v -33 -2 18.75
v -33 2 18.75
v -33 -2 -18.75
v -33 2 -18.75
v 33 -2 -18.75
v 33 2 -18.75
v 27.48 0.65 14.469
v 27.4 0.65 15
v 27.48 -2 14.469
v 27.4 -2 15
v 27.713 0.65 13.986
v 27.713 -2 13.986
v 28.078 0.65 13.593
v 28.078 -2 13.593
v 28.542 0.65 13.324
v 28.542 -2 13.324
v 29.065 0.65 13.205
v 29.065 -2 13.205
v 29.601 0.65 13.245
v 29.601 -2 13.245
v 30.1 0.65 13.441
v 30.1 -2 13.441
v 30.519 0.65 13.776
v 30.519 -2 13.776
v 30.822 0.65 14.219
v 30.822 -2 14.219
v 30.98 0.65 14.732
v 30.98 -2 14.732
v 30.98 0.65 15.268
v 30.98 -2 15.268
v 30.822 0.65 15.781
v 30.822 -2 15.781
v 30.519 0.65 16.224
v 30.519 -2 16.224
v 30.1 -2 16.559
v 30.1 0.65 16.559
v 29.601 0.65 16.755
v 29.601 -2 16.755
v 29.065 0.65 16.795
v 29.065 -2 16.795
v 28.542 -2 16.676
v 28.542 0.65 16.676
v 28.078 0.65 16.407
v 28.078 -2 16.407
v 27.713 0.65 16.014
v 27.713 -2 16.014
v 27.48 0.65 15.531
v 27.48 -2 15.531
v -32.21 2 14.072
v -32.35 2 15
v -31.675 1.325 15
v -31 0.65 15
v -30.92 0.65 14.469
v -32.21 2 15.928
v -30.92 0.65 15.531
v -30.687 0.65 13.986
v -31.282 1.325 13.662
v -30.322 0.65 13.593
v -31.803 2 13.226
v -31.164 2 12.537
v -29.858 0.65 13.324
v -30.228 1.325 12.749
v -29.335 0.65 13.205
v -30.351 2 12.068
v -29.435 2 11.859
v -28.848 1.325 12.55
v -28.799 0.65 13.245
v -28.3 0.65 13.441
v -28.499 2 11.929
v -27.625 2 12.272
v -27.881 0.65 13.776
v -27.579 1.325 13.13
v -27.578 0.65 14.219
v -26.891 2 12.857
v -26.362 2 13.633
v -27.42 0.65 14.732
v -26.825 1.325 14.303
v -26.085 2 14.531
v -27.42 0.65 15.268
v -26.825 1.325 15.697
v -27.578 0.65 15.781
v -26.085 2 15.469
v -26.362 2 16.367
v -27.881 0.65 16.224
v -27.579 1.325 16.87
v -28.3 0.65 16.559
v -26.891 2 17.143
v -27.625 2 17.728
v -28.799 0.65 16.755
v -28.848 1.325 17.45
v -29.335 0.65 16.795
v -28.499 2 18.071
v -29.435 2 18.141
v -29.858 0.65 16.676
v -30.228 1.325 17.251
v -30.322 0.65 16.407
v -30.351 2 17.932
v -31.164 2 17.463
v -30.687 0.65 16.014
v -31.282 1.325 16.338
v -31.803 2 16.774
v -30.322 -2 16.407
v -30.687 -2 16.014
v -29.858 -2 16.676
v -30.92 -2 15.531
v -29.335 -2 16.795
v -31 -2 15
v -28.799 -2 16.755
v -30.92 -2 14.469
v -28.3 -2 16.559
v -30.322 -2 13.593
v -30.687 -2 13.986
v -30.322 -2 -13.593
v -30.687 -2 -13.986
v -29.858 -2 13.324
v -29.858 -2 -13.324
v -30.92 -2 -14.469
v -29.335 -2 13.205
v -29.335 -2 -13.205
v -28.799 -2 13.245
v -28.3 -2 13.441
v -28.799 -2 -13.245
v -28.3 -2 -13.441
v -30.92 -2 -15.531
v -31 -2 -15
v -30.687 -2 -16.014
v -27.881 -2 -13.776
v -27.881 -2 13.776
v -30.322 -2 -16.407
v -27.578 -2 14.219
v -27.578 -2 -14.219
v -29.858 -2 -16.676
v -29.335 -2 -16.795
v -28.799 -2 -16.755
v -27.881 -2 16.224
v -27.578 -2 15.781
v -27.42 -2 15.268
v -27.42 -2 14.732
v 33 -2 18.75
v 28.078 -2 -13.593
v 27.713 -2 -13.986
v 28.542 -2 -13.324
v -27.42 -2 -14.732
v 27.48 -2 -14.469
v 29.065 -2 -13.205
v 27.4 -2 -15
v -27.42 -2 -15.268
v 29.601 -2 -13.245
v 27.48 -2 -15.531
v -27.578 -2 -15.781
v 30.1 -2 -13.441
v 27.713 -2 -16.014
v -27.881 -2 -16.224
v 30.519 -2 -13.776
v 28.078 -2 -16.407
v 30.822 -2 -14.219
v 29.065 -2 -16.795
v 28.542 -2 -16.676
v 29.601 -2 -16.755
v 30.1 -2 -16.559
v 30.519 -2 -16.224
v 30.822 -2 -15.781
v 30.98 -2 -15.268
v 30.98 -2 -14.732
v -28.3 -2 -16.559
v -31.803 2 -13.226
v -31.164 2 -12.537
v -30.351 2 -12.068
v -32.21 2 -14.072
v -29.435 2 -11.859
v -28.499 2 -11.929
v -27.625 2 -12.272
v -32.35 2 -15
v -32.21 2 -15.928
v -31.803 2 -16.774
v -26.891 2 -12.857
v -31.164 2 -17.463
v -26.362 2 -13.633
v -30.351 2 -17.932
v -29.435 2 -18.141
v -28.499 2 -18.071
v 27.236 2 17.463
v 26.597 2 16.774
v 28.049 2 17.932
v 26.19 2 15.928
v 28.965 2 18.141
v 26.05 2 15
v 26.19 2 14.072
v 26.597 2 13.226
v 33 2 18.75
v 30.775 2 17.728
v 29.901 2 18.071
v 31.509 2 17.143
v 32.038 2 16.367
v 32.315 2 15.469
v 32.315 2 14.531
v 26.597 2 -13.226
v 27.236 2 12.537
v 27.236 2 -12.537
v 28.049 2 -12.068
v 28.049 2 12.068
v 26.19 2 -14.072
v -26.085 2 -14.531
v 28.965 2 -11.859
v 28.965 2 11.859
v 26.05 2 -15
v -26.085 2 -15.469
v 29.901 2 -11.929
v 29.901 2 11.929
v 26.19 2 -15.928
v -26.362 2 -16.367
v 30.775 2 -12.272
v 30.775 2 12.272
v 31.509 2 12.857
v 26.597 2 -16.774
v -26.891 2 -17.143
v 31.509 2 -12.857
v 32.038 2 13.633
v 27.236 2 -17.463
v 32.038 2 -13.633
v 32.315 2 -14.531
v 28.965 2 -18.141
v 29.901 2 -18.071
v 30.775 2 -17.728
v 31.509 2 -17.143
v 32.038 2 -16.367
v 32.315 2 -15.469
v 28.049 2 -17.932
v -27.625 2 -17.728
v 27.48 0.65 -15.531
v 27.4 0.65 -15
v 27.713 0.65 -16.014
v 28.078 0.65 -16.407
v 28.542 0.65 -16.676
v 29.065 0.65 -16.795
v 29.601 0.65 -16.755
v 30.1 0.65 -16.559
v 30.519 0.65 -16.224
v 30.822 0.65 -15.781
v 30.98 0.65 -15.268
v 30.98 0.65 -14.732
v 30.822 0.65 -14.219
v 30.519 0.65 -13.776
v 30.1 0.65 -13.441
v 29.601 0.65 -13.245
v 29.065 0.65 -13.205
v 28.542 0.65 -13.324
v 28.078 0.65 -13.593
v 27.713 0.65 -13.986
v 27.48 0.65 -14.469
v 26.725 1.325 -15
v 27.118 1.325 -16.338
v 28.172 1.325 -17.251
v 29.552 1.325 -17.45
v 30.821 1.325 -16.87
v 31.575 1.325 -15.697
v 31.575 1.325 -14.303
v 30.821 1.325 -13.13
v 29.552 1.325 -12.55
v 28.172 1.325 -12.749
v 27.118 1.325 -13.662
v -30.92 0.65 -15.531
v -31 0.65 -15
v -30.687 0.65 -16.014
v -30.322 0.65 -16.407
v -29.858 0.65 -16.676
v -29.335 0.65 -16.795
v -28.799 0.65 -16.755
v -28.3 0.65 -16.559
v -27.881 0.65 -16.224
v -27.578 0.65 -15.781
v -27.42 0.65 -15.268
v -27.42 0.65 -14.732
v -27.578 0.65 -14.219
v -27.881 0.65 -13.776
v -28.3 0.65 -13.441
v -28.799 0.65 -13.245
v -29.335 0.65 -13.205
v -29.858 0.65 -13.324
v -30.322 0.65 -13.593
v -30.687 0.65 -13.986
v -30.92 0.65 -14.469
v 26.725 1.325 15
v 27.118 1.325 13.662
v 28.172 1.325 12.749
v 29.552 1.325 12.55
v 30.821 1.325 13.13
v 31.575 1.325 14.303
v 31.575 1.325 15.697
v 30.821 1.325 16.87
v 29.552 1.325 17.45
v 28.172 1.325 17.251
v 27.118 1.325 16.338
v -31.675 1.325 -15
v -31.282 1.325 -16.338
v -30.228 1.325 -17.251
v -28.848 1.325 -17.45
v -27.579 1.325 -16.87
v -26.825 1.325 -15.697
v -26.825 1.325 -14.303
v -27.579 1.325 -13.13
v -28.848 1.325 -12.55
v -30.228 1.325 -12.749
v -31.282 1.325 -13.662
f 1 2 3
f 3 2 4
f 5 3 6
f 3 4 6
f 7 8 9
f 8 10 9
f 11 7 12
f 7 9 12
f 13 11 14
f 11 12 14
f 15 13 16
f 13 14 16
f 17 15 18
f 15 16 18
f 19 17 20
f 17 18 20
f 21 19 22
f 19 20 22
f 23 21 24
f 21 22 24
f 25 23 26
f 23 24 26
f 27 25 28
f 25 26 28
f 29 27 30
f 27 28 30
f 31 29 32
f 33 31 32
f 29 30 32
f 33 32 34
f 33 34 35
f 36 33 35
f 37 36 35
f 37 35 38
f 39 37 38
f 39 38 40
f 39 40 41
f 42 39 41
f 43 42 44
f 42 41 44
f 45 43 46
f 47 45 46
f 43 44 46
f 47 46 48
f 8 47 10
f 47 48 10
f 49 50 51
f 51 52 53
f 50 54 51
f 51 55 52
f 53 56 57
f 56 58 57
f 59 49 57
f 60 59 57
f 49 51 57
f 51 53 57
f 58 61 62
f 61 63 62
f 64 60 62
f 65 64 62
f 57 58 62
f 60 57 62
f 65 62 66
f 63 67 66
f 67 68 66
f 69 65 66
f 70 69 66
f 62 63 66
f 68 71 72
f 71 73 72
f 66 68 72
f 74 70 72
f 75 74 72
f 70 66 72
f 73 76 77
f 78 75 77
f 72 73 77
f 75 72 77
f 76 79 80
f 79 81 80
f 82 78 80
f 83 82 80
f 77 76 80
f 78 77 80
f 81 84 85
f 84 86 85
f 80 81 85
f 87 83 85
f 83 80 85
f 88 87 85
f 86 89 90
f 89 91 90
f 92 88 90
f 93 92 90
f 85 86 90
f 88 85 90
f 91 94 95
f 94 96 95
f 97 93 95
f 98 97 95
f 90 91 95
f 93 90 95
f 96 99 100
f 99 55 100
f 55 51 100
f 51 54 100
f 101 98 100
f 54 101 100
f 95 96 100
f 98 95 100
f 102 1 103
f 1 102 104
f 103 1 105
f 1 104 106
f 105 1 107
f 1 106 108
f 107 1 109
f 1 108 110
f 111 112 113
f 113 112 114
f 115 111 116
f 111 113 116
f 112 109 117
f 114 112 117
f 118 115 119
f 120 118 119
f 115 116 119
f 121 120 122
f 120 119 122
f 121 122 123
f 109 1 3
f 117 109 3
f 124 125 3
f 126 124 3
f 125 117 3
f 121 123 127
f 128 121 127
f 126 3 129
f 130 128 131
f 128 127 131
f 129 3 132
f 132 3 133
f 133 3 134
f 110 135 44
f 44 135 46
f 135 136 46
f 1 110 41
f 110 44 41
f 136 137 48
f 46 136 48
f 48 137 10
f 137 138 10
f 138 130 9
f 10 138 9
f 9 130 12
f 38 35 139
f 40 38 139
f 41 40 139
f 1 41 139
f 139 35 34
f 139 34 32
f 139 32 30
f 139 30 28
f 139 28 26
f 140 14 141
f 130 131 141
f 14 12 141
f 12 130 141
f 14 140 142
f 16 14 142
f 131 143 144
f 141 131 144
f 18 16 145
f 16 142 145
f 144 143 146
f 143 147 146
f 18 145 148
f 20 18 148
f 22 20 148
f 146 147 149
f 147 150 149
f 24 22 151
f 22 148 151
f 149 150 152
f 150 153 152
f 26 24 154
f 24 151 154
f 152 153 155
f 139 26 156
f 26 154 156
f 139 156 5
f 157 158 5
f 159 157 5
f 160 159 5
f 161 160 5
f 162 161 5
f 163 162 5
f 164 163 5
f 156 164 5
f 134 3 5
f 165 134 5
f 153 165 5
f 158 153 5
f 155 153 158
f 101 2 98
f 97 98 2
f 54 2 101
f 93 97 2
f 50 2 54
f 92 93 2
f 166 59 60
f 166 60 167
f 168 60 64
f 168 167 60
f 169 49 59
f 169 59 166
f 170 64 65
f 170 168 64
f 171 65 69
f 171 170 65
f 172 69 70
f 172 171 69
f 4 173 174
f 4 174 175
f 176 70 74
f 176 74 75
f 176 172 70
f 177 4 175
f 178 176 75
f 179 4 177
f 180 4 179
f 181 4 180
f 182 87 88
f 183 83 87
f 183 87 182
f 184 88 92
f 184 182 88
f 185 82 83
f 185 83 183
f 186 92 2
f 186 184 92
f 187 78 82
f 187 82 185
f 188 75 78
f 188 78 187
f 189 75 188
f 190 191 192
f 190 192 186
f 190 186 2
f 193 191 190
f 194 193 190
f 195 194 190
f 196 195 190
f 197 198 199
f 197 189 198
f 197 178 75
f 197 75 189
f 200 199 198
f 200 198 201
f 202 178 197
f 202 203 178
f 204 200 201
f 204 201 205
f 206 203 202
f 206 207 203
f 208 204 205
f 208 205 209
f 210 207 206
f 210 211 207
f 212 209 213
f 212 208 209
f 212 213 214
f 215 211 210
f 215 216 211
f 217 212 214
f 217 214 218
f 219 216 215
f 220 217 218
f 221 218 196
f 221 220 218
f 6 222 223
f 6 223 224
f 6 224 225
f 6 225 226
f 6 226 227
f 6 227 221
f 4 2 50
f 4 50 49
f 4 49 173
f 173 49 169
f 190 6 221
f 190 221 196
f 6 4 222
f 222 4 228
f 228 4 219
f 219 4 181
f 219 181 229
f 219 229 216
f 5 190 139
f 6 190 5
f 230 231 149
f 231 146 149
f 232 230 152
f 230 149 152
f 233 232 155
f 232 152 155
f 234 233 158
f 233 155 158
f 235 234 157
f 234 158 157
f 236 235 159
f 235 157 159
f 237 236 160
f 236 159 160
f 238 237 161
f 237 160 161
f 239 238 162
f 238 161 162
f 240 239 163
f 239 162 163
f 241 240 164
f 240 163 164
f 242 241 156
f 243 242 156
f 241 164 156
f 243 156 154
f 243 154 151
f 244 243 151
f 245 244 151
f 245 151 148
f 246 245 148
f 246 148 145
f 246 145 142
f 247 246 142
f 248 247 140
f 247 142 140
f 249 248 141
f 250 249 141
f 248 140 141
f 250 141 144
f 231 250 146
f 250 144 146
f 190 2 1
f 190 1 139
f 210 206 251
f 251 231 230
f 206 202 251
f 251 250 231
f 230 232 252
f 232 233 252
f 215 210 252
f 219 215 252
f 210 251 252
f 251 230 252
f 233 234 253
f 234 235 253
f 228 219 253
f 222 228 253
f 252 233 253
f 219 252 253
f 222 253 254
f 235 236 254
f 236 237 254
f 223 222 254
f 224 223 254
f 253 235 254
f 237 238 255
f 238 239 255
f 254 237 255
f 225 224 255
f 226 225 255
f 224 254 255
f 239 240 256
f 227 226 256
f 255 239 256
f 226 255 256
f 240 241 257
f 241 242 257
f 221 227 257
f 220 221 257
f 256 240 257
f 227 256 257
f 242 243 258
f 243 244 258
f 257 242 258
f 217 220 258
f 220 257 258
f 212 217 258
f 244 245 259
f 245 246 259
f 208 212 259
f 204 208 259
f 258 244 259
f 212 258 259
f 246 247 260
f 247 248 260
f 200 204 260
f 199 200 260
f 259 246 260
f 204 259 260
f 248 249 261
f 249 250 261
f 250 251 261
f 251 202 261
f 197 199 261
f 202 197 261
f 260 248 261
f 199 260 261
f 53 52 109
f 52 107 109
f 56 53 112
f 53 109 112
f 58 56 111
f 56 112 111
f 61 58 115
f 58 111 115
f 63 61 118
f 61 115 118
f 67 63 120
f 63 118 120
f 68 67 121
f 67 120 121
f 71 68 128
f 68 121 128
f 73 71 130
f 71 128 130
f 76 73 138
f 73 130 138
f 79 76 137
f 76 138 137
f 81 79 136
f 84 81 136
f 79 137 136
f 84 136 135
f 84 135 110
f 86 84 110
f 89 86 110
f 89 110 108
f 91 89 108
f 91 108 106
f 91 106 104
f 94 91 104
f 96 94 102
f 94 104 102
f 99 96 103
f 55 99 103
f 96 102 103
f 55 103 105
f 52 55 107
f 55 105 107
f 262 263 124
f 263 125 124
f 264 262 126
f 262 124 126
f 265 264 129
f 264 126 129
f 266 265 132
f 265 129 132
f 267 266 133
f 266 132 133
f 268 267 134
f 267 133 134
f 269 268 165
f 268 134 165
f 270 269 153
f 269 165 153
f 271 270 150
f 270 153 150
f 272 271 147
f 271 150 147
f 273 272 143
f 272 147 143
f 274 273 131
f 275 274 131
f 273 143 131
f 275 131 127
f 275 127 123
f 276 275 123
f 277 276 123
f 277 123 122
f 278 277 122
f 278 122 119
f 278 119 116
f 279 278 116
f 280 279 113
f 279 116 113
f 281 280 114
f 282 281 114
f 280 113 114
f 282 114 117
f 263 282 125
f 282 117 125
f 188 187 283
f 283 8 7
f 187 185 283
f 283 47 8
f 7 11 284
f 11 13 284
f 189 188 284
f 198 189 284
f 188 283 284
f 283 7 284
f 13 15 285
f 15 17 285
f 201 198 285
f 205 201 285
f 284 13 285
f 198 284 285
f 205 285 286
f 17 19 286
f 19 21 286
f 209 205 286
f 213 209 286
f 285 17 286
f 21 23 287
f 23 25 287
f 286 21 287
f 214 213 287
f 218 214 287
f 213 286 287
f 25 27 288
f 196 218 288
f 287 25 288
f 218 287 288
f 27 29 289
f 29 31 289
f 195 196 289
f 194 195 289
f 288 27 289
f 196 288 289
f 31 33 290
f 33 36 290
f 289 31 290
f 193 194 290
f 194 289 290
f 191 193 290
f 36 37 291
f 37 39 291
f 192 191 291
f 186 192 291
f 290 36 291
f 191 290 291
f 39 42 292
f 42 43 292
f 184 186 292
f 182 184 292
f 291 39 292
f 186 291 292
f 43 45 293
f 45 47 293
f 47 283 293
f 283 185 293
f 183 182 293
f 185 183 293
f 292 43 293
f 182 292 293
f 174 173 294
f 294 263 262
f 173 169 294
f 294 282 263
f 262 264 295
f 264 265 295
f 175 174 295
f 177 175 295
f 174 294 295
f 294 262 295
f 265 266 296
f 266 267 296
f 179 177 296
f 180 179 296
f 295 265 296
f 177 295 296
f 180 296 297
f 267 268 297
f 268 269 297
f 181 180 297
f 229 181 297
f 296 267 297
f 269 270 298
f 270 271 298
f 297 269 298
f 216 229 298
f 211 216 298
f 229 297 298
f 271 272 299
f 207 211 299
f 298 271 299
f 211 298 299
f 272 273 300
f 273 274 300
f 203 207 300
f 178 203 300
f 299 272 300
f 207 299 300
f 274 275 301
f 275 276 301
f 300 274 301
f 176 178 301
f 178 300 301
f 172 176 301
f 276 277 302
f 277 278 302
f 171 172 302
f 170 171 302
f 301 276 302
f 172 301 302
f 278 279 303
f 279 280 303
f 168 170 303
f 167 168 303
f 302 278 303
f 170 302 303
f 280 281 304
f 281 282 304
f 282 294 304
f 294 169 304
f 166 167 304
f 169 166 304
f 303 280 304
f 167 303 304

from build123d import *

# Parameters (mm, degrees)
SKETCH1_W                                           = 66
SKETCH1_H                                           = 37.5
BOSS_EXTRUDE1_DEPTH                                 = 2
CSK_FOR_M3_COUNTERSUNK_FLAT_HEAD_SCREW1_D           = 3.6
CSK_FOR_M3_COUNTERSUNK_FLAT_HEAD_SCREW1_DEPTH       = 5
CSK_FOR_M3_COUNTERSUNK_FLAT_HEAD_SCREW1_CSINK_D     = 6.3
CSK_FOR_M3_COUNTERSUNK_FLAT_HEAD_SCREW1_CSINK_ANGLE = 90
CSK_FOR_M3_COUNTERSUNK_FLAT_HEAD_SCREW1_TIP         = 1.081549114


with BuildPart() as part:
    # Sketch1 → Boss-Extrude1 (new, symmetric)
    with BuildSketch(Plane(origin=(0, 0, 0), x_dir=(1, 0, 0), z_dir=(0, 1, 0))):
        Rectangle(SKETCH1_W, SKETCH1_H)
    extrude(amount=BOSS_EXTRUDE1_DEPTH, both=True)

    # CSK for M3 Countersunk Flat Head Screw1
    with Locations(Plane(origin=(0, 2, 0), x_dir=(1, 0, 0), z_dir=(0, 1, 0))):
        with Locations((-29.2, -15), (-29.2, 15), (29.2, 15), (29.2, -15)):
            CounterSinkHole(CSK_FOR_M3_COUNTERSUNK_FLAT_HEAD_SCREW1_D / 2, CSK_FOR_M3_COUNTERSUNK_FLAT_HEAD_SCREW1_CSINK_D / 2, depth=CSK_FOR_M3_COUNTERSUNK_FLAT_HEAD_SCREW1_DEPTH, counter_sink_angle=CSK_FOR_M3_COUNTERSUNK_FLAT_HEAD_SCREW1_CSINK_ANGLE)
            with Locations((0, 0, -(CSK_FOR_M3_COUNTERSUNK_FLAT_HEAD_SCREW1_DEPTH + CSK_FOR_M3_COUNTERSUNK_FLAT_HEAD_SCREW1_TIP / 2))):  # 118° drill point
                Cone(0, CSK_FOR_M3_COUNTERSUNK_FLAT_HEAD_SCREW1_D / 2, CSK_FOR_M3_COUNTERSUNK_FLAT_HEAD_SCREW1_TIP, mode=Mode.SUBTRACT)


solid = part.part
